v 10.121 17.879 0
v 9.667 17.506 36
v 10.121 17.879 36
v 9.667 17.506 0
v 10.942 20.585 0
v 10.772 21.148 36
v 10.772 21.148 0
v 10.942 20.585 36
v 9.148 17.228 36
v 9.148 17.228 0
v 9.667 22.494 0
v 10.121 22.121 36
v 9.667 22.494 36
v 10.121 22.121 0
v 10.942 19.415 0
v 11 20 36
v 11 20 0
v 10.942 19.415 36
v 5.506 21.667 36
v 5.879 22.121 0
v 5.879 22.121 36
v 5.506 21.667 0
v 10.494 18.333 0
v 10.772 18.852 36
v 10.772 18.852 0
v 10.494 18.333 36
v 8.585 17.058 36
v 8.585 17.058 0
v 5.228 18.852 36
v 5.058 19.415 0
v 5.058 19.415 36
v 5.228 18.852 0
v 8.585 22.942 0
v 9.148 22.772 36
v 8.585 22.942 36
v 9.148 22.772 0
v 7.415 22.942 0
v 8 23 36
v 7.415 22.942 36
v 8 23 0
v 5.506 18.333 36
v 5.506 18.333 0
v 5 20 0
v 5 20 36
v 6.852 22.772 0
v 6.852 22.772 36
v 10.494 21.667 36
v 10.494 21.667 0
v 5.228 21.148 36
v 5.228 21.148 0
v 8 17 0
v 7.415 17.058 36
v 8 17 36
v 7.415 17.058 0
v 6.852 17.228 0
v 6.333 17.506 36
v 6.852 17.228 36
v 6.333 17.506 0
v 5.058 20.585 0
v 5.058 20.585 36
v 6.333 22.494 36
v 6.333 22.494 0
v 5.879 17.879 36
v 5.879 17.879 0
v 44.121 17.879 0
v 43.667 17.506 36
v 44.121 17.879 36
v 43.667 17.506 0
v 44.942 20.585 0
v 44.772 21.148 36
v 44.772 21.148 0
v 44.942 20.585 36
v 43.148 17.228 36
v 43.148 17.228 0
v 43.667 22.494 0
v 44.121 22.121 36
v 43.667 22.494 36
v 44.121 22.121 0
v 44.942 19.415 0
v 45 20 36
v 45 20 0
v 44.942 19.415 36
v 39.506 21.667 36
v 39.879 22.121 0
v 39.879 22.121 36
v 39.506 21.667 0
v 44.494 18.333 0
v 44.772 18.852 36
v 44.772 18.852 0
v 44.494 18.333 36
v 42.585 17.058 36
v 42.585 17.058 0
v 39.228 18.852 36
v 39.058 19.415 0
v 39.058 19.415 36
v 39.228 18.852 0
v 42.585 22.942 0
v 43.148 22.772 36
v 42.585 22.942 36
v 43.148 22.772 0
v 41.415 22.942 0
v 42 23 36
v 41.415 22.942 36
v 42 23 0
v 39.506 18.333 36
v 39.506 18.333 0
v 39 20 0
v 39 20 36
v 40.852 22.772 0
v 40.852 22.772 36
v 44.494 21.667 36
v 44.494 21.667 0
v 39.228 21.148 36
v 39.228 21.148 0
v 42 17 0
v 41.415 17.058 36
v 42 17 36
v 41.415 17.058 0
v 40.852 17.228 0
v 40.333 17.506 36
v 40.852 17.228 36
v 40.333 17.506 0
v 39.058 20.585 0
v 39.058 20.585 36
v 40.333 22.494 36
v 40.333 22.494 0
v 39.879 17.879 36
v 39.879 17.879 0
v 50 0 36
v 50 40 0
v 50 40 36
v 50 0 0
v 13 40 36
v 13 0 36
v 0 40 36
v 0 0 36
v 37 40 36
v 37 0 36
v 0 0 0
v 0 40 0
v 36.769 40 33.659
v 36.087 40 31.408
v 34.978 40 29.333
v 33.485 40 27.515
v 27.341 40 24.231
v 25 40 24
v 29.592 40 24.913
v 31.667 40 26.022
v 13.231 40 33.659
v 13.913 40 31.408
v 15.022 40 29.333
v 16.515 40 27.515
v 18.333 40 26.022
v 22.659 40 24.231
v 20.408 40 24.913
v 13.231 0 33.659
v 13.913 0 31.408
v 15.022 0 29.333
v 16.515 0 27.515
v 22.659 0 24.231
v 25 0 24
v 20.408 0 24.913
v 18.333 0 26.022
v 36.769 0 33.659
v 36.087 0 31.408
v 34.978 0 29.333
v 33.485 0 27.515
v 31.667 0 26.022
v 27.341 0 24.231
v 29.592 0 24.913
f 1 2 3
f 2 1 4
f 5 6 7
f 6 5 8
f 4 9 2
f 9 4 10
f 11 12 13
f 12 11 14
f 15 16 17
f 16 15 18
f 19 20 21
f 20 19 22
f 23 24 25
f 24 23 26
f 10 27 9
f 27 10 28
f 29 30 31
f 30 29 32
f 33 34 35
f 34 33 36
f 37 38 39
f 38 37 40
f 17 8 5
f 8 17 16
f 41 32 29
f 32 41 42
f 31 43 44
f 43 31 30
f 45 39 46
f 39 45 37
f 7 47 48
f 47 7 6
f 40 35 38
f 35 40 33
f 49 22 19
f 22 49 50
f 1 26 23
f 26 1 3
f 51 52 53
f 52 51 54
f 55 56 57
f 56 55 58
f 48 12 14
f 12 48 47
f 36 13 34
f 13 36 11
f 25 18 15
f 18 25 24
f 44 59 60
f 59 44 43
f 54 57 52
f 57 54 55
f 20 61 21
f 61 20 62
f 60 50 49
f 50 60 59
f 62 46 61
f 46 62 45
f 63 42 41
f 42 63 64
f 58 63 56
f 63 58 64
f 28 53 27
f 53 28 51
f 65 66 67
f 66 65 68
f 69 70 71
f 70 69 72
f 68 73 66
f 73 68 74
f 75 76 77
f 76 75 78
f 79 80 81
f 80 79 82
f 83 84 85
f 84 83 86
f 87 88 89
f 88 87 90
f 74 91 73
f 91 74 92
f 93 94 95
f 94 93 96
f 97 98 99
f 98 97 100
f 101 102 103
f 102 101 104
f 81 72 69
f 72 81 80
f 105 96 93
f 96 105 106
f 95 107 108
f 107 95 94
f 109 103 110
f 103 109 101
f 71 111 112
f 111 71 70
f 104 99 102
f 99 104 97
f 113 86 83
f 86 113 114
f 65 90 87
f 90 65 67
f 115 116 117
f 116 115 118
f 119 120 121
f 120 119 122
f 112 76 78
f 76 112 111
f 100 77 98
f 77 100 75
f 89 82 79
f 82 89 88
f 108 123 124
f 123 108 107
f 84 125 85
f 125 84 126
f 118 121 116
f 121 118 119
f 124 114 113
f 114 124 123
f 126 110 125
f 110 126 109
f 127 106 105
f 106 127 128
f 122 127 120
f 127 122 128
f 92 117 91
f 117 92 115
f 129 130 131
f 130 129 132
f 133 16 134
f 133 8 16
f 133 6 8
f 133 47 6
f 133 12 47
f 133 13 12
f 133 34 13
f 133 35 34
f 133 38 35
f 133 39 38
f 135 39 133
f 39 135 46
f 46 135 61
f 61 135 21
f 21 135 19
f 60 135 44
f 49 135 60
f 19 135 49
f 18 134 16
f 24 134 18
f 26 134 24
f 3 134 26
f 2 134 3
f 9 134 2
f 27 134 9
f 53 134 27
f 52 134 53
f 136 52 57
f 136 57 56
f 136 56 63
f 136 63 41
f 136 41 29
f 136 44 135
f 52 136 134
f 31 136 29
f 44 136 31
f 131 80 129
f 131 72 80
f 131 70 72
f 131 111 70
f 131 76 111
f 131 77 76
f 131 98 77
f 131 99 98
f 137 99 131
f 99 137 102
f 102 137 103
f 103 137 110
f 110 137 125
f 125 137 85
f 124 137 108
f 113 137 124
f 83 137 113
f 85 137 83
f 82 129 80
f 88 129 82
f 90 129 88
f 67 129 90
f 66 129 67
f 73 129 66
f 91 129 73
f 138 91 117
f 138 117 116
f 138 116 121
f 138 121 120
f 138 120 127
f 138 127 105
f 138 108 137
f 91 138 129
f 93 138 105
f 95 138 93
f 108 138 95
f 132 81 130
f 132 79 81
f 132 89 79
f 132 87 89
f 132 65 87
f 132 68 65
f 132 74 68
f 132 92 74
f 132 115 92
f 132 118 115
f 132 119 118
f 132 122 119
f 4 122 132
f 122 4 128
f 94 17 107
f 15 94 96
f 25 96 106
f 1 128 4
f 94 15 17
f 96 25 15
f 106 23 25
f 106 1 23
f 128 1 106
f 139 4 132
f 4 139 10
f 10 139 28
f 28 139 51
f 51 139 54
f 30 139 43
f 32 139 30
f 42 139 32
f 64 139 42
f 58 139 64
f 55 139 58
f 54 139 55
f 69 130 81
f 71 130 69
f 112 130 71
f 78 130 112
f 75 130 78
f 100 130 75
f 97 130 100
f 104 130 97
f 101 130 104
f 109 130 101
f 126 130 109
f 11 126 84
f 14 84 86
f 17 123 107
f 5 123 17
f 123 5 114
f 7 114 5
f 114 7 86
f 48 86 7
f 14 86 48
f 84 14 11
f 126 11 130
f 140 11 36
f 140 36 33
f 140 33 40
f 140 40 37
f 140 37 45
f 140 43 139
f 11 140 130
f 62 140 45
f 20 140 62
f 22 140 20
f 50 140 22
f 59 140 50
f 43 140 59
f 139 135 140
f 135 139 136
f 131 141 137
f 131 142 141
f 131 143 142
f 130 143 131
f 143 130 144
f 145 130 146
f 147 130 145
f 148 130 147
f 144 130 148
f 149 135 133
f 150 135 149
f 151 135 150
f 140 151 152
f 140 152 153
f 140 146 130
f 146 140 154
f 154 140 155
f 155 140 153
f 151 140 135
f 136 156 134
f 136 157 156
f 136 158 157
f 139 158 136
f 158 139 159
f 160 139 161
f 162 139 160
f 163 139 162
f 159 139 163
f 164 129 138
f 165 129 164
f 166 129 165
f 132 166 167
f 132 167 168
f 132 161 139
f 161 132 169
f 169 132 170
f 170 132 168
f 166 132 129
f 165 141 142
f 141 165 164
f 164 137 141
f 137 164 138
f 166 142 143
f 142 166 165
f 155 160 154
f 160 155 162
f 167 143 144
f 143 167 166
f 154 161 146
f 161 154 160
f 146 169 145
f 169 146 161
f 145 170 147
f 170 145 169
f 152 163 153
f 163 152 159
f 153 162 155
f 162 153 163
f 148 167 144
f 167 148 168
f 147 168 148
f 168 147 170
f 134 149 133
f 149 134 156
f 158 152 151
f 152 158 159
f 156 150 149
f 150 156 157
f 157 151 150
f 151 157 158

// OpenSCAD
$fn = 32;

// ----------------------------------------------------------------------
// Saddle clamp: plain shaft clamp
// ----------------------------------------------------------------------

// --- parameters (mm) ---
blk_l = 50;               // block length, X
blk_w = 40;               // block width, Y
blk_h = 36;               // block height
clamp_r = 12;             // shaft groove radius
hole_r = 3;               // bolt hole radius
hole_m = 8;               // bolt hole margin from the ends

saw_depth = clamp_r + 3;  // saw kerf depth

difference() {
  cube([blk_l, blk_w, blk_h]);
  translate([blk_l / 2, -1, blk_h])
    rotate([-90, 0, 0])
      cylinder(h = blk_w + 2, r = clamp_r);
  for (sx = [0, 1])
    translate([sx ? blk_l - hole_m : hole_m, blk_w / 2, -1])
      cylinder(r = hole_r, h = blk_h + 2);
}
